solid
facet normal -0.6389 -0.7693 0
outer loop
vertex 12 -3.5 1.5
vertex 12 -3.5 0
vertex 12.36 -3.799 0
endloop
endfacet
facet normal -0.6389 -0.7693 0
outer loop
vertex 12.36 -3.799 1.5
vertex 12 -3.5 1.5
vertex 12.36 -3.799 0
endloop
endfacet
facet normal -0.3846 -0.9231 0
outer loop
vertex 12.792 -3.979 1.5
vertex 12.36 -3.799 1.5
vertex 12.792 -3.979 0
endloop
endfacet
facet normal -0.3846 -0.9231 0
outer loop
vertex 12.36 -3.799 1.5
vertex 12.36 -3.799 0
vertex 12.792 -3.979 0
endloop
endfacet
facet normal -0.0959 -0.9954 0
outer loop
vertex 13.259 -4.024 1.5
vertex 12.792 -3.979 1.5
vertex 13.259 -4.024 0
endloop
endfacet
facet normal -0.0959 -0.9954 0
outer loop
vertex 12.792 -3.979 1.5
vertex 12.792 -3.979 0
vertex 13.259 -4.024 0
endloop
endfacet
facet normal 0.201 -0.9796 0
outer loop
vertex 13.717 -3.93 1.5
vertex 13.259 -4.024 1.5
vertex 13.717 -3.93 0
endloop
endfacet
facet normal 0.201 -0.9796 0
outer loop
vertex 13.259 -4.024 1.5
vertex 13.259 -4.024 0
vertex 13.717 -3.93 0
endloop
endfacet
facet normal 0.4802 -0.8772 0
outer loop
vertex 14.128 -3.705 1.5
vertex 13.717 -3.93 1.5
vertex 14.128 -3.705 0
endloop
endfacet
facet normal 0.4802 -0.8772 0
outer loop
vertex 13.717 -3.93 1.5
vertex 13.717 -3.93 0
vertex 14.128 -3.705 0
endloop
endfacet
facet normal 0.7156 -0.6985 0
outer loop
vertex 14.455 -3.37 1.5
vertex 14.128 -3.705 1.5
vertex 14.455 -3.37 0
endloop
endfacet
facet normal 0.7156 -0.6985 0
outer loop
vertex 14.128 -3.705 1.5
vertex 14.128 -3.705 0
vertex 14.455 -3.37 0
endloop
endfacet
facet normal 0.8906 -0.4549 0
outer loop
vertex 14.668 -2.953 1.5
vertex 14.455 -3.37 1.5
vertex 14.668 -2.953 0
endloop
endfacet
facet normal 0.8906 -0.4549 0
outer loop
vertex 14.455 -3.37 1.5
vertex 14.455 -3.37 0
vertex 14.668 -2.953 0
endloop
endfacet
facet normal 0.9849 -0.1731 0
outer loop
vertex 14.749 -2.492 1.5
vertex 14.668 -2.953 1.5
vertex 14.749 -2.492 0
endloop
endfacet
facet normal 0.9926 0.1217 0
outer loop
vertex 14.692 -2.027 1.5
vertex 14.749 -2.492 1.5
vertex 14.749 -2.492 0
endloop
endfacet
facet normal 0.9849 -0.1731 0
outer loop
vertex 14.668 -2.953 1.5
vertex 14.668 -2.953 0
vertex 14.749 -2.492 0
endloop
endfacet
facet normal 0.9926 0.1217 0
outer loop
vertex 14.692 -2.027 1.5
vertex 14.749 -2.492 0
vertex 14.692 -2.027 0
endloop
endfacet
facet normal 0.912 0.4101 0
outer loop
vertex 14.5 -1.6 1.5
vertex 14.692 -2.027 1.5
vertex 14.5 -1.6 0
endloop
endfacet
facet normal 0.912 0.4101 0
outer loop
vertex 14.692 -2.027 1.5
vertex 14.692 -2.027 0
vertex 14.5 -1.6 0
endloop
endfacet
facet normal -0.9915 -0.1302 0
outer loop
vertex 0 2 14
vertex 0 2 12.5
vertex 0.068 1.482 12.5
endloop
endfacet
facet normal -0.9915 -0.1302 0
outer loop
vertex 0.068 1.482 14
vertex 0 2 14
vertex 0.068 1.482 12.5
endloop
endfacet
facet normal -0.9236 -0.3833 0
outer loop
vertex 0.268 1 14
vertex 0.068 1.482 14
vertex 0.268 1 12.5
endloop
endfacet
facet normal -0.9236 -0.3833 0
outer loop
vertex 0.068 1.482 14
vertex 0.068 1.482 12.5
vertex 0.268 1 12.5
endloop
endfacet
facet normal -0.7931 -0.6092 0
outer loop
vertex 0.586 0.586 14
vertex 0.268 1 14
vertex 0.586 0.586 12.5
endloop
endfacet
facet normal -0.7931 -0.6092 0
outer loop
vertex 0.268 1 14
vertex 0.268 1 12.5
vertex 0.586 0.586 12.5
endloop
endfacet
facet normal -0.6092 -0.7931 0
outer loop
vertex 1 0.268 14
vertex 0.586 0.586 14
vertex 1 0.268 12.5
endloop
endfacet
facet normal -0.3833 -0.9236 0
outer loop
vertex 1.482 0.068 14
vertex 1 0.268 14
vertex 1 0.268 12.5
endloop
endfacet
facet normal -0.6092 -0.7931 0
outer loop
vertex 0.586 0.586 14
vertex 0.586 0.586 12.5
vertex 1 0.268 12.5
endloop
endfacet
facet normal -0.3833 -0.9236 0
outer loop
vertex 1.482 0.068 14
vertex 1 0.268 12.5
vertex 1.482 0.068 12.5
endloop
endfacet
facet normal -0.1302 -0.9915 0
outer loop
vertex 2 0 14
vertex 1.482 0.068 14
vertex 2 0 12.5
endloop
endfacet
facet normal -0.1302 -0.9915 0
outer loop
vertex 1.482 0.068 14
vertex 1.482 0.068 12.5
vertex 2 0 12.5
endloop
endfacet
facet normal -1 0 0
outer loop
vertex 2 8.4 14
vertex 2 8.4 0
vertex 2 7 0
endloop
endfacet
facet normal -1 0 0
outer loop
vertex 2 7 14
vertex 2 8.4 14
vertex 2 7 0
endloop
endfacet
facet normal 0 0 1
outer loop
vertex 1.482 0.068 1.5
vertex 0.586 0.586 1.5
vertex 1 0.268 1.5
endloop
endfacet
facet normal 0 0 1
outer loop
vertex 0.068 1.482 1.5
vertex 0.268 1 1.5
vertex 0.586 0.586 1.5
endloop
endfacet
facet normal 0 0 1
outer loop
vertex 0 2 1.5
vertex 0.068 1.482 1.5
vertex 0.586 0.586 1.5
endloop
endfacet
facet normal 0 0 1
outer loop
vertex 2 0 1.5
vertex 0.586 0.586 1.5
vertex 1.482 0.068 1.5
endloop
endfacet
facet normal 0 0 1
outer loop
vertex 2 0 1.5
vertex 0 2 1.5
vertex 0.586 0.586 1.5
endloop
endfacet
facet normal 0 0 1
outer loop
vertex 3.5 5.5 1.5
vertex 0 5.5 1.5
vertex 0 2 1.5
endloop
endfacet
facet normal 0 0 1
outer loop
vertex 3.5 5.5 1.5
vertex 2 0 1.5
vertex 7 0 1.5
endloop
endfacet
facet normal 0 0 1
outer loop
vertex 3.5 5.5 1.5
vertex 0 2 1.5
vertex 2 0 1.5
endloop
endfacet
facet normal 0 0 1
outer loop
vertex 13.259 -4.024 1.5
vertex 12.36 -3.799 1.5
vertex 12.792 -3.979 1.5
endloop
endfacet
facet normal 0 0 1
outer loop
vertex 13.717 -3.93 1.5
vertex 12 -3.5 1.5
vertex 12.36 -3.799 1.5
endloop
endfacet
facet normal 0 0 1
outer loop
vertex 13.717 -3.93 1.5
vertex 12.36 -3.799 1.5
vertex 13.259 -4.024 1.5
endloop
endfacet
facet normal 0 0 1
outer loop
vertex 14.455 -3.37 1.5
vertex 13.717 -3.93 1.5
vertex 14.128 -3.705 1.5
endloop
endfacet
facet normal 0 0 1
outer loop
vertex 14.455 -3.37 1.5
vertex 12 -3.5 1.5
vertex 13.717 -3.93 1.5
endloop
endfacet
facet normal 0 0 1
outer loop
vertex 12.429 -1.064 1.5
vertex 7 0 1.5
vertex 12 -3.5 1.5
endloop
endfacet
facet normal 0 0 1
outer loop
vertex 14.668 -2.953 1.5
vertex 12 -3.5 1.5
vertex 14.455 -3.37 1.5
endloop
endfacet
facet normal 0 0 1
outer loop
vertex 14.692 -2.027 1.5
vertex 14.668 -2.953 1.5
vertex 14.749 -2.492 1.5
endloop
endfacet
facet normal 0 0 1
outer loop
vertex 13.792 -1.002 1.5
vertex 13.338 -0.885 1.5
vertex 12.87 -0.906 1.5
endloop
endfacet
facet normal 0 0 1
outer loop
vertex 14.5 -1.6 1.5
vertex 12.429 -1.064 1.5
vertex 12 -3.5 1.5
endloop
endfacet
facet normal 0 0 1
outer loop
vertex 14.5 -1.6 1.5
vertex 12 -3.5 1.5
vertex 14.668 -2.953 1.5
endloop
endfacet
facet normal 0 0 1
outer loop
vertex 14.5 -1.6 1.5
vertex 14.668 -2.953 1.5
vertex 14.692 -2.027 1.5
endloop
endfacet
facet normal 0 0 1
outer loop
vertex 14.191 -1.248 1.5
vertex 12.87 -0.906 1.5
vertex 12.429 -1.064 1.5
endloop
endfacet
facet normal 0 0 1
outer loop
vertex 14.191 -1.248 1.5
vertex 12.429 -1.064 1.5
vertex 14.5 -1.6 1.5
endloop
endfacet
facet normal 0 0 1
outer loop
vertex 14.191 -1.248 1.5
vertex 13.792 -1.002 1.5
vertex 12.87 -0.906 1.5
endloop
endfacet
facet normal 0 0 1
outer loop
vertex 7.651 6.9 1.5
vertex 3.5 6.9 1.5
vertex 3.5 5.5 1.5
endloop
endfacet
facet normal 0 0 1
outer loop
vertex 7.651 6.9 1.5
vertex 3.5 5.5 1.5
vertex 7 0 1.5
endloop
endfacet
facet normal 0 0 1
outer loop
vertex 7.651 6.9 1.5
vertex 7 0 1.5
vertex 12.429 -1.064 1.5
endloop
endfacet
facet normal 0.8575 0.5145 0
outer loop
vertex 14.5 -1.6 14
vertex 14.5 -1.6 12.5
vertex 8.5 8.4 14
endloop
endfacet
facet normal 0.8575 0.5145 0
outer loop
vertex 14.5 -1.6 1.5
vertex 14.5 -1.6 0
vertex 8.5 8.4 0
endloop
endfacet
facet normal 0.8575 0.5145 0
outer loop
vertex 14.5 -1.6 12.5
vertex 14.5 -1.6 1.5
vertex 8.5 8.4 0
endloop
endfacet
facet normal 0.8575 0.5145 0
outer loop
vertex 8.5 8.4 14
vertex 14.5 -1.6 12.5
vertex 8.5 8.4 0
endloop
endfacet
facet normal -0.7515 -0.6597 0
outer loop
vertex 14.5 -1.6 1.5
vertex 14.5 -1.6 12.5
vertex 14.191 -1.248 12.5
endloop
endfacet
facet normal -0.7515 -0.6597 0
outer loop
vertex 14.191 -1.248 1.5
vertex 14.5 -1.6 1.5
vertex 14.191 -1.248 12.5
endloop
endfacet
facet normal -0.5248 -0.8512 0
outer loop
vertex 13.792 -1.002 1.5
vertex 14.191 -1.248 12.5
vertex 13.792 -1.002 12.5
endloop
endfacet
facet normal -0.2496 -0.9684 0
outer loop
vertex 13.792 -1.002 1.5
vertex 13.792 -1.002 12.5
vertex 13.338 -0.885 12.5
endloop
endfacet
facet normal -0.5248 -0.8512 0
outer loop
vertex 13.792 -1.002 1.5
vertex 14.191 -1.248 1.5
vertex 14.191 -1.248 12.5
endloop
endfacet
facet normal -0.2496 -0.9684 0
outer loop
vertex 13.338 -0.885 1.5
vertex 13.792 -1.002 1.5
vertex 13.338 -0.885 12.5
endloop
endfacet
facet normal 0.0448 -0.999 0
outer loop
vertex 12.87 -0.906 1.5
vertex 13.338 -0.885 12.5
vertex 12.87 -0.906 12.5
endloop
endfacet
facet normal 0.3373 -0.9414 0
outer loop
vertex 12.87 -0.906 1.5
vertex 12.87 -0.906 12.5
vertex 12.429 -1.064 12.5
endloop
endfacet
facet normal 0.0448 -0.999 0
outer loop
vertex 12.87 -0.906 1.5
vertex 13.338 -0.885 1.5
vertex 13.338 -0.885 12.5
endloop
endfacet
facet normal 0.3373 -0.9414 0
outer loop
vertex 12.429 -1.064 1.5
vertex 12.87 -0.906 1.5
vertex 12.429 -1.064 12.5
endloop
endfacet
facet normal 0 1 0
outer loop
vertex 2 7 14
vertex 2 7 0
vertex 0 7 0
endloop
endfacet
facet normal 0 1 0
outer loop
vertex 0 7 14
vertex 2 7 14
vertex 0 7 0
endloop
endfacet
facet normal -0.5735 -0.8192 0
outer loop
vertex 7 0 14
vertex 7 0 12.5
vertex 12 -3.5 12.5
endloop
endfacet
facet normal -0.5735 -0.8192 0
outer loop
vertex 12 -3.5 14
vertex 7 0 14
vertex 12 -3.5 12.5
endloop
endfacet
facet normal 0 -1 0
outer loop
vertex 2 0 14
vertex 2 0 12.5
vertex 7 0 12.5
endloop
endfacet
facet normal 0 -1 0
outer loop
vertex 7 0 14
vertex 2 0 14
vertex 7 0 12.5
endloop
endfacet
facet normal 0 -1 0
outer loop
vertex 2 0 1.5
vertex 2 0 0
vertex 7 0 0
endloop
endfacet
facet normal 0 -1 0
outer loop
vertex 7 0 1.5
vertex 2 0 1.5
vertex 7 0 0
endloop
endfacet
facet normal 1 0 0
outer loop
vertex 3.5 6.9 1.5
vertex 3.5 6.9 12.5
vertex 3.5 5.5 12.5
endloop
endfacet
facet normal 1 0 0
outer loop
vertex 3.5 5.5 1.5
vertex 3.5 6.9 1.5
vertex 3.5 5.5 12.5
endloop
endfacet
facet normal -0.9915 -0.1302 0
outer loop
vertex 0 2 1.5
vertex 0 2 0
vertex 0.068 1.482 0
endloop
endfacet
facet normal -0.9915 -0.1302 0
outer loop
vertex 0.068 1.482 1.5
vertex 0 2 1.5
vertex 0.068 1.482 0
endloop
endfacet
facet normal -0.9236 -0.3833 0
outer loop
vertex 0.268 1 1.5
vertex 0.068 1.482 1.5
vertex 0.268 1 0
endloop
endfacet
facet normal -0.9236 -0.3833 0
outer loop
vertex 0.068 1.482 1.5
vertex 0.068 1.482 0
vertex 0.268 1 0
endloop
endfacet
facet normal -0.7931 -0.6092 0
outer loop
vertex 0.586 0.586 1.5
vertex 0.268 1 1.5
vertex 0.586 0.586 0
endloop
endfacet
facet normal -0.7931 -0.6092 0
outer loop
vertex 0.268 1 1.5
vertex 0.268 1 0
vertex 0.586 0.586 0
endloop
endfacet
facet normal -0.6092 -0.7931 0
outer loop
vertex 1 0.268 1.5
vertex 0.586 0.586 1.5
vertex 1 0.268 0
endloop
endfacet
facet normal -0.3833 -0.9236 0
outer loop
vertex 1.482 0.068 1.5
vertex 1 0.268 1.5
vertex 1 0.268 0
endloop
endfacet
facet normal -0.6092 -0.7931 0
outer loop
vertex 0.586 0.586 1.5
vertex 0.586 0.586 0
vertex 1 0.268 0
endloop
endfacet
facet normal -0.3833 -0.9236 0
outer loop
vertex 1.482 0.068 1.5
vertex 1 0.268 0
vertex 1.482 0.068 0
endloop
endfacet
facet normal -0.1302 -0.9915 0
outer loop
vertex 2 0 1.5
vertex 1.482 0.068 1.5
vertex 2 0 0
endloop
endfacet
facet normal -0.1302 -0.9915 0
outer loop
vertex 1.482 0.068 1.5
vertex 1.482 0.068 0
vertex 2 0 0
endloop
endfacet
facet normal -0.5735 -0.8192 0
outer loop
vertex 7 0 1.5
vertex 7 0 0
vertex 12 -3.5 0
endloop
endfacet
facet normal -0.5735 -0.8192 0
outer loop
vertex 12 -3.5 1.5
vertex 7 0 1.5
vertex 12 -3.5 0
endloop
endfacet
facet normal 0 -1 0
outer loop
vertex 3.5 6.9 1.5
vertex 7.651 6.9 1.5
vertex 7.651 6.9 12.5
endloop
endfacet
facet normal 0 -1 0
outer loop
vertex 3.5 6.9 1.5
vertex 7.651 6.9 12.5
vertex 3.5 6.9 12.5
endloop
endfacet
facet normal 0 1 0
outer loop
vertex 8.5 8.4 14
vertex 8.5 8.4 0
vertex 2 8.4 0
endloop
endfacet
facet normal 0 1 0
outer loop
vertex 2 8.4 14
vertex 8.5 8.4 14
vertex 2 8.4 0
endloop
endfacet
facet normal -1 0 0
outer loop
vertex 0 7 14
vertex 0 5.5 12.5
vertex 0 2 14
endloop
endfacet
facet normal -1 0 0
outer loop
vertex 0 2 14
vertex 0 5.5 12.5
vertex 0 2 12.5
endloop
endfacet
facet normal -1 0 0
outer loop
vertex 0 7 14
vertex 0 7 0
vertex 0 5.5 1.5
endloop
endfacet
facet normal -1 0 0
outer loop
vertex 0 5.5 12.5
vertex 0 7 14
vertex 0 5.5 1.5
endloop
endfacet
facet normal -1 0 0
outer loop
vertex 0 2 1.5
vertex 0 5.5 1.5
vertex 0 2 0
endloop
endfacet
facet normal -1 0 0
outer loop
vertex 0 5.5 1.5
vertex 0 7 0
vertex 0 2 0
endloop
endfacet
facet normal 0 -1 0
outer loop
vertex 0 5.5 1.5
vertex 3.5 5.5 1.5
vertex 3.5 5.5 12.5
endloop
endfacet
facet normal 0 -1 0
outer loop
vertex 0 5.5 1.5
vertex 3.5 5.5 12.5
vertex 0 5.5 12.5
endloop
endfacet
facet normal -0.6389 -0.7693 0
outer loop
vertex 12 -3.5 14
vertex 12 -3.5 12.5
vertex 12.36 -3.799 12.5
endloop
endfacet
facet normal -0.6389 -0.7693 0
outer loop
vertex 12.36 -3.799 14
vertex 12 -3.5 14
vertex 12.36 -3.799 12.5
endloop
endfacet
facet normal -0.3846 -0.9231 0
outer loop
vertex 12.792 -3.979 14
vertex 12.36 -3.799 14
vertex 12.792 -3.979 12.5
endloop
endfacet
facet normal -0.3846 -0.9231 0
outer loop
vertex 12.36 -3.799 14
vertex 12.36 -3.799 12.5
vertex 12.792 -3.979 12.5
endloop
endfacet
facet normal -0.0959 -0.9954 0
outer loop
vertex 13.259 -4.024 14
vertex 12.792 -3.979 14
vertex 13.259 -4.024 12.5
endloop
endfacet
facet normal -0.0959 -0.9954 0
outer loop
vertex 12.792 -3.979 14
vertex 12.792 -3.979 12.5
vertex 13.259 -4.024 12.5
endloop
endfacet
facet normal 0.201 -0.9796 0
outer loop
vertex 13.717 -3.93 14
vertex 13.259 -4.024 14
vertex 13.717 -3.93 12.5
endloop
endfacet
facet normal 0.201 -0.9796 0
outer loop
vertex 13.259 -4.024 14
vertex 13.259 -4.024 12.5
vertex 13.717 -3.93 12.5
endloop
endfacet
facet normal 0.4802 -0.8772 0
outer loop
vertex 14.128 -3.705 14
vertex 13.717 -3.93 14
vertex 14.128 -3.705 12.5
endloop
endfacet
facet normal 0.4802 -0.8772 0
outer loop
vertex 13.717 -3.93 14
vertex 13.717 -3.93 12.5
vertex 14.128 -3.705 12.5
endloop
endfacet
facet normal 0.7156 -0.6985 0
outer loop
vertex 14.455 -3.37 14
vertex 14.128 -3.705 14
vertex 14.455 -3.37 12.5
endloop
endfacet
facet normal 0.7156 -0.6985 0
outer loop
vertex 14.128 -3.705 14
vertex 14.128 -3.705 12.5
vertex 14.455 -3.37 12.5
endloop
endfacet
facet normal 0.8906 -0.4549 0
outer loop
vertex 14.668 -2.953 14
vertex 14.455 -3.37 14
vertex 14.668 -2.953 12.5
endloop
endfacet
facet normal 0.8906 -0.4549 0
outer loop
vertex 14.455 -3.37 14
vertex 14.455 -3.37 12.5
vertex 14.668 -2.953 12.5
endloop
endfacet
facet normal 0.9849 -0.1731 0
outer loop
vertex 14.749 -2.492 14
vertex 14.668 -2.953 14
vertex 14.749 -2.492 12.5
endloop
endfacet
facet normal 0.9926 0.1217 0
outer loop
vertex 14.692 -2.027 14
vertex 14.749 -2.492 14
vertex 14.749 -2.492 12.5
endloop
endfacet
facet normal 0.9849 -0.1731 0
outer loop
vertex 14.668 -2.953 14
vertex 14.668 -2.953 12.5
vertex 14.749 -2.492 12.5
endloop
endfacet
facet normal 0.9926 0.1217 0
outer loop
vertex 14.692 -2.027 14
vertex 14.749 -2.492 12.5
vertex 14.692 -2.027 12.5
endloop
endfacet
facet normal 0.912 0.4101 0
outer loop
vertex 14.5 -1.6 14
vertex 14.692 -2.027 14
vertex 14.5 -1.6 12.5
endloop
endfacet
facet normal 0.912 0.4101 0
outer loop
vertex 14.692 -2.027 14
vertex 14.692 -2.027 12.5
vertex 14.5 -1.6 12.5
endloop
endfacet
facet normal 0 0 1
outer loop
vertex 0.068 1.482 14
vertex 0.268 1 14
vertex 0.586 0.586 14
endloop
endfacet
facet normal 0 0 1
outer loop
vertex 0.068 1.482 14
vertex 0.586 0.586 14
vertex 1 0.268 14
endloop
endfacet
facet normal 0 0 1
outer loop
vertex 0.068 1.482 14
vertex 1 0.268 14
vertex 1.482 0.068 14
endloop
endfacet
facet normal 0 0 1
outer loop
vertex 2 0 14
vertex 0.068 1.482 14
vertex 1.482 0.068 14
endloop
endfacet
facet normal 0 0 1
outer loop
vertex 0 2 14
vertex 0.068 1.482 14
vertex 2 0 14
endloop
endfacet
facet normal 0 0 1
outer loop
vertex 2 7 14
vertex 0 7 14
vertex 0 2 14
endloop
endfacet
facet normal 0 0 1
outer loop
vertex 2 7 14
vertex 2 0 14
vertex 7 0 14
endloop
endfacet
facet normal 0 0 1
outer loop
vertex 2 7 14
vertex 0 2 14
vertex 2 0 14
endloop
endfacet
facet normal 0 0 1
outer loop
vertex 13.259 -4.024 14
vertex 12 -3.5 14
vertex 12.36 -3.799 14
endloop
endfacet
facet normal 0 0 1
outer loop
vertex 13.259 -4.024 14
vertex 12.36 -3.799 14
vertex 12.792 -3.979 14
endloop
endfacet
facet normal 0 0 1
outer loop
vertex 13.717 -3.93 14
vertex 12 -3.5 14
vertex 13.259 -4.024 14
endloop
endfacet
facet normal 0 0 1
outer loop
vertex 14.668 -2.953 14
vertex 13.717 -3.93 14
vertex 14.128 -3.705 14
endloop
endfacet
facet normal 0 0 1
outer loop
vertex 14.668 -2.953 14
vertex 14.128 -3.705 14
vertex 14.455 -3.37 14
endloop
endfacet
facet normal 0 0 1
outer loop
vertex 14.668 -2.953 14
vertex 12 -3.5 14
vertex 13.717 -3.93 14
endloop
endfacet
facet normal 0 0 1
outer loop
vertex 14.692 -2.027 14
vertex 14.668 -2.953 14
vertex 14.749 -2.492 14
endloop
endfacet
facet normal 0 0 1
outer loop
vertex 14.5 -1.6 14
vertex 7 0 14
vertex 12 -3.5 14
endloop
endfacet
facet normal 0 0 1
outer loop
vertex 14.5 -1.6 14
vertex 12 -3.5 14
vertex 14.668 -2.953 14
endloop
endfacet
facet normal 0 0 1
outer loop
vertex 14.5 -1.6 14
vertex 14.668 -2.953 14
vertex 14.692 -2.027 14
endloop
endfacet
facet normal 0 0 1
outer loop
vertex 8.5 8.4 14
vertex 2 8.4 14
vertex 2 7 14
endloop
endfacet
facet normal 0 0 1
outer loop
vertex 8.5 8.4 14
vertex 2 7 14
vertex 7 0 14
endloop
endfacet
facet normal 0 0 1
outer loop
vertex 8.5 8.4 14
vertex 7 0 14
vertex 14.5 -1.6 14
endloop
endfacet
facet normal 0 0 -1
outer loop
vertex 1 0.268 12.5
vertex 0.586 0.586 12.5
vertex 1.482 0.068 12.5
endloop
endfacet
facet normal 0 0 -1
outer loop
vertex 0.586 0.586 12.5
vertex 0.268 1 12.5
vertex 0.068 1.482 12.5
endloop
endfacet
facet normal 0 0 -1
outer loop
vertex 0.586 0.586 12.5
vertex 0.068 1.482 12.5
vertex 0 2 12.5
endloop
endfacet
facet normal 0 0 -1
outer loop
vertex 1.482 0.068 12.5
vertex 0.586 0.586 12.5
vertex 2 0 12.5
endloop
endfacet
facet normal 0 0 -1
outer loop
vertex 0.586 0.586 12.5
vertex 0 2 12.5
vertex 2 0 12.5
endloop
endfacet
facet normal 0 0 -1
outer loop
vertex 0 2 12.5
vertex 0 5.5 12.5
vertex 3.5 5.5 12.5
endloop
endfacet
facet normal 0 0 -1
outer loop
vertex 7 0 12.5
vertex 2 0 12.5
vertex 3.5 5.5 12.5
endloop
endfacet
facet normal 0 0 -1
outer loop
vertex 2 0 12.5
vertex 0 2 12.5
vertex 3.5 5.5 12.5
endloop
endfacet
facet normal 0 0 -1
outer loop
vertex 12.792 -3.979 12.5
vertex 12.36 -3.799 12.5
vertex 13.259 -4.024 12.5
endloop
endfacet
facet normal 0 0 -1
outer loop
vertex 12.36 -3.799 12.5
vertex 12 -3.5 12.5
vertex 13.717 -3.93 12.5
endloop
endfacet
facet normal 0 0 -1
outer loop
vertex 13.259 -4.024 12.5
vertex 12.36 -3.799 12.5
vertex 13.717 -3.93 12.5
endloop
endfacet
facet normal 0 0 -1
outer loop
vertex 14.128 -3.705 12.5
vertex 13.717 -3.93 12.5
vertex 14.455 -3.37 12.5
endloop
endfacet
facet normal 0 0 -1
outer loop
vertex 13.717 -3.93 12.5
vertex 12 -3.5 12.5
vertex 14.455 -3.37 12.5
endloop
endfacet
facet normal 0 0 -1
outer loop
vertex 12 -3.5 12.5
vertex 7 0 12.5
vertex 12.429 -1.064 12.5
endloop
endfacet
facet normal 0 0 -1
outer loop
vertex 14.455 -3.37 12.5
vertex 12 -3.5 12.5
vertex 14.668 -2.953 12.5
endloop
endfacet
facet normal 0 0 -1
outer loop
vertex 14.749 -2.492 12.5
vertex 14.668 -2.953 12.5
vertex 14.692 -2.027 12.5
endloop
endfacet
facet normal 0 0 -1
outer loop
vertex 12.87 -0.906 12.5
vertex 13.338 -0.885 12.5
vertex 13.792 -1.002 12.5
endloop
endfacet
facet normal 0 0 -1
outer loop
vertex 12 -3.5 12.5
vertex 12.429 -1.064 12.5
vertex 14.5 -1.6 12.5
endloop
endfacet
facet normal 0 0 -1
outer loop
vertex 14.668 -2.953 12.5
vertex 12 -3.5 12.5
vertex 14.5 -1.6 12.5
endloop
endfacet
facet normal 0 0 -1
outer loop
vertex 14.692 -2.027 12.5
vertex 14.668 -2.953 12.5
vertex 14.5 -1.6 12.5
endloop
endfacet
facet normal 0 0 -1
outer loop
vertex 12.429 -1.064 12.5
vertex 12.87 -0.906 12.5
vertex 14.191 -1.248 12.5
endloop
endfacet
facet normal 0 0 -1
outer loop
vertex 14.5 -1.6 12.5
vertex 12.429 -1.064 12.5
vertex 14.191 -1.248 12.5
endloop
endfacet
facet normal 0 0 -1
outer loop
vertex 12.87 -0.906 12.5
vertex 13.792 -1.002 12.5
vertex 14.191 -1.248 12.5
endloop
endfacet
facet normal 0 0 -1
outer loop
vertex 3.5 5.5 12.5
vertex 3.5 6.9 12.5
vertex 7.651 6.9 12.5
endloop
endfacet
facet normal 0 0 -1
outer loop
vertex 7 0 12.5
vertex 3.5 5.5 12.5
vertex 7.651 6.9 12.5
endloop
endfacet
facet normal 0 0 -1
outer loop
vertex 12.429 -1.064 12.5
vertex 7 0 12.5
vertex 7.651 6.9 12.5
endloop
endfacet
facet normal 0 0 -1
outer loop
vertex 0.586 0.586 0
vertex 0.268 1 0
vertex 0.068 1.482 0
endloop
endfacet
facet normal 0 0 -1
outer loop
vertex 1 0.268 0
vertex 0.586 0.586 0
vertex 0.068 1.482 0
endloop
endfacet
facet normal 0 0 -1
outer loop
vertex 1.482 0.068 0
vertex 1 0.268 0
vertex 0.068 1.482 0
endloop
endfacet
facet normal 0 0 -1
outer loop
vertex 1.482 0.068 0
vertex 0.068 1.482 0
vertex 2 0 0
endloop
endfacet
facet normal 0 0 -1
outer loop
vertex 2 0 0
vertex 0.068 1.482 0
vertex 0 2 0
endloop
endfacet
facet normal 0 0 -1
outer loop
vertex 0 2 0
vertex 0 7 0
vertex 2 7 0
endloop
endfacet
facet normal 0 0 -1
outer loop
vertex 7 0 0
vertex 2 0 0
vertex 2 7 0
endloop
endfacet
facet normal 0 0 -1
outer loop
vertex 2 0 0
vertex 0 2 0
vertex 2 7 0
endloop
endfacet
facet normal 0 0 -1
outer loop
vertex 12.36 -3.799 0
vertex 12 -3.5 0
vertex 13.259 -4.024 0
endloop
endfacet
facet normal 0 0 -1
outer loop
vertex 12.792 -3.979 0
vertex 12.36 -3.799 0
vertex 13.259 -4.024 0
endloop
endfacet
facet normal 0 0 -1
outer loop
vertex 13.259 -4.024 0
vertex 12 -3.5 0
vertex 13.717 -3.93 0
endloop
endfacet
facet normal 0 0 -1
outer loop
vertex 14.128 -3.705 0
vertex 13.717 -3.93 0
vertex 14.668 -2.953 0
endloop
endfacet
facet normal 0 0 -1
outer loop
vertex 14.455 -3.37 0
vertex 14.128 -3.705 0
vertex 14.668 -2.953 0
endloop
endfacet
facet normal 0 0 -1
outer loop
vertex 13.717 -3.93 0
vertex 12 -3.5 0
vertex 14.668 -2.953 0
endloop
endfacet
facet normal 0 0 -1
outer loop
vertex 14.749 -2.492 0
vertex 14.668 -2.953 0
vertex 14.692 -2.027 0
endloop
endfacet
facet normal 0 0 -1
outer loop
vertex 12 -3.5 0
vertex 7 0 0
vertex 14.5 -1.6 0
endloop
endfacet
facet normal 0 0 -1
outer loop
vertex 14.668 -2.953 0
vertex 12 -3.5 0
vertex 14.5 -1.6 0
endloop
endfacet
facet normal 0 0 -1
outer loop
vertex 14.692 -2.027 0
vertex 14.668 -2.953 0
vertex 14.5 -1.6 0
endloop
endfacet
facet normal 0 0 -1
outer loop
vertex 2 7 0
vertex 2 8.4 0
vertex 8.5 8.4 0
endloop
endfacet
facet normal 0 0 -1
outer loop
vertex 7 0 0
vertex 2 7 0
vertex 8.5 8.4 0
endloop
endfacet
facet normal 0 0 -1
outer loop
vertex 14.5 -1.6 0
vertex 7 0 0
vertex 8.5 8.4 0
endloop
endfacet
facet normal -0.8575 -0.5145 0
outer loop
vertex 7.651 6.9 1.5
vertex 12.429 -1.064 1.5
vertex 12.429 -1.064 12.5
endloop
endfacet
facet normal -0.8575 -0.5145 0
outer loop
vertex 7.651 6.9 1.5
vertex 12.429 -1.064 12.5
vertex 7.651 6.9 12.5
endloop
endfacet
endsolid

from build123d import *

# Parameters (mm, degrees)
ESTRUSIONE_ESTRUSIONE1_DEPTH = 14
SVUOTA2_START                = 1.5
SVUOTA2_DEPTH                = 11


# Read off the part's stored shape, not the designer's step: Svuota2
with BuildPart() as part:
    # Schizzo1 → Estrusione-Estrusione1 (new body)
    with BuildSketch(Plane.XY):
        with BuildLine():
            Line((0, 7), (0, 2))
            ThreePointArc((0, 2), (0.585786438, 0.585786438), (2, 0))
            Line((2, 0), (7, 0))
            Line((7, 0), (12, -3.5))
            ThreePointArc((12, -3.5), (14.128037504, -3.705312505), (14.5, -1.6))
            Line((14.5, -1.6), (8.5, 8.4))
            Line((8.5, 8.4), (2, 8.4))
            Line((2, 8.4), (2, 7))
            Line((2, 7), (0, 7))
        make_face()
    extrude(amount=ESTRUSIONE_ESTRUSIONE1_DEPTH)

    # Svuota2 outline → Svuota2 (cut)
    with BuildSketch(Plane.XY.offset(SVUOTA2_START)):
        with BuildLine():
            Line((3.5, 5.5), (0, 5.5))
            Line((0, 5.5), (0, 2))
            ThreePointArc((0, 2), (0.585786438, 0.585786438), (2, 0))
            Line((2, 0), (7, 0))
            Line((7, 0), (12, -3.5))
            ThreePointArc((12, -3.5), (14.128037504, -3.705312505), (14.5, -1.6))
            ThreePointArc((14.5, -1.6), (13.569534227, -0.926722507), (12.429297297, -1.064304775))
            Line((12.429297297, -1.064304775), (7.650714432, 6.9))
            Line((7.650714432, 6.9), (3.5, 6.9))
            Line((3.5, 6.9), (3.5, 5.5))
        make_face()
    extrude(amount=SVUOTA2_DEPTH, mode=Mode.SUBTRACT)


solid = part.part
